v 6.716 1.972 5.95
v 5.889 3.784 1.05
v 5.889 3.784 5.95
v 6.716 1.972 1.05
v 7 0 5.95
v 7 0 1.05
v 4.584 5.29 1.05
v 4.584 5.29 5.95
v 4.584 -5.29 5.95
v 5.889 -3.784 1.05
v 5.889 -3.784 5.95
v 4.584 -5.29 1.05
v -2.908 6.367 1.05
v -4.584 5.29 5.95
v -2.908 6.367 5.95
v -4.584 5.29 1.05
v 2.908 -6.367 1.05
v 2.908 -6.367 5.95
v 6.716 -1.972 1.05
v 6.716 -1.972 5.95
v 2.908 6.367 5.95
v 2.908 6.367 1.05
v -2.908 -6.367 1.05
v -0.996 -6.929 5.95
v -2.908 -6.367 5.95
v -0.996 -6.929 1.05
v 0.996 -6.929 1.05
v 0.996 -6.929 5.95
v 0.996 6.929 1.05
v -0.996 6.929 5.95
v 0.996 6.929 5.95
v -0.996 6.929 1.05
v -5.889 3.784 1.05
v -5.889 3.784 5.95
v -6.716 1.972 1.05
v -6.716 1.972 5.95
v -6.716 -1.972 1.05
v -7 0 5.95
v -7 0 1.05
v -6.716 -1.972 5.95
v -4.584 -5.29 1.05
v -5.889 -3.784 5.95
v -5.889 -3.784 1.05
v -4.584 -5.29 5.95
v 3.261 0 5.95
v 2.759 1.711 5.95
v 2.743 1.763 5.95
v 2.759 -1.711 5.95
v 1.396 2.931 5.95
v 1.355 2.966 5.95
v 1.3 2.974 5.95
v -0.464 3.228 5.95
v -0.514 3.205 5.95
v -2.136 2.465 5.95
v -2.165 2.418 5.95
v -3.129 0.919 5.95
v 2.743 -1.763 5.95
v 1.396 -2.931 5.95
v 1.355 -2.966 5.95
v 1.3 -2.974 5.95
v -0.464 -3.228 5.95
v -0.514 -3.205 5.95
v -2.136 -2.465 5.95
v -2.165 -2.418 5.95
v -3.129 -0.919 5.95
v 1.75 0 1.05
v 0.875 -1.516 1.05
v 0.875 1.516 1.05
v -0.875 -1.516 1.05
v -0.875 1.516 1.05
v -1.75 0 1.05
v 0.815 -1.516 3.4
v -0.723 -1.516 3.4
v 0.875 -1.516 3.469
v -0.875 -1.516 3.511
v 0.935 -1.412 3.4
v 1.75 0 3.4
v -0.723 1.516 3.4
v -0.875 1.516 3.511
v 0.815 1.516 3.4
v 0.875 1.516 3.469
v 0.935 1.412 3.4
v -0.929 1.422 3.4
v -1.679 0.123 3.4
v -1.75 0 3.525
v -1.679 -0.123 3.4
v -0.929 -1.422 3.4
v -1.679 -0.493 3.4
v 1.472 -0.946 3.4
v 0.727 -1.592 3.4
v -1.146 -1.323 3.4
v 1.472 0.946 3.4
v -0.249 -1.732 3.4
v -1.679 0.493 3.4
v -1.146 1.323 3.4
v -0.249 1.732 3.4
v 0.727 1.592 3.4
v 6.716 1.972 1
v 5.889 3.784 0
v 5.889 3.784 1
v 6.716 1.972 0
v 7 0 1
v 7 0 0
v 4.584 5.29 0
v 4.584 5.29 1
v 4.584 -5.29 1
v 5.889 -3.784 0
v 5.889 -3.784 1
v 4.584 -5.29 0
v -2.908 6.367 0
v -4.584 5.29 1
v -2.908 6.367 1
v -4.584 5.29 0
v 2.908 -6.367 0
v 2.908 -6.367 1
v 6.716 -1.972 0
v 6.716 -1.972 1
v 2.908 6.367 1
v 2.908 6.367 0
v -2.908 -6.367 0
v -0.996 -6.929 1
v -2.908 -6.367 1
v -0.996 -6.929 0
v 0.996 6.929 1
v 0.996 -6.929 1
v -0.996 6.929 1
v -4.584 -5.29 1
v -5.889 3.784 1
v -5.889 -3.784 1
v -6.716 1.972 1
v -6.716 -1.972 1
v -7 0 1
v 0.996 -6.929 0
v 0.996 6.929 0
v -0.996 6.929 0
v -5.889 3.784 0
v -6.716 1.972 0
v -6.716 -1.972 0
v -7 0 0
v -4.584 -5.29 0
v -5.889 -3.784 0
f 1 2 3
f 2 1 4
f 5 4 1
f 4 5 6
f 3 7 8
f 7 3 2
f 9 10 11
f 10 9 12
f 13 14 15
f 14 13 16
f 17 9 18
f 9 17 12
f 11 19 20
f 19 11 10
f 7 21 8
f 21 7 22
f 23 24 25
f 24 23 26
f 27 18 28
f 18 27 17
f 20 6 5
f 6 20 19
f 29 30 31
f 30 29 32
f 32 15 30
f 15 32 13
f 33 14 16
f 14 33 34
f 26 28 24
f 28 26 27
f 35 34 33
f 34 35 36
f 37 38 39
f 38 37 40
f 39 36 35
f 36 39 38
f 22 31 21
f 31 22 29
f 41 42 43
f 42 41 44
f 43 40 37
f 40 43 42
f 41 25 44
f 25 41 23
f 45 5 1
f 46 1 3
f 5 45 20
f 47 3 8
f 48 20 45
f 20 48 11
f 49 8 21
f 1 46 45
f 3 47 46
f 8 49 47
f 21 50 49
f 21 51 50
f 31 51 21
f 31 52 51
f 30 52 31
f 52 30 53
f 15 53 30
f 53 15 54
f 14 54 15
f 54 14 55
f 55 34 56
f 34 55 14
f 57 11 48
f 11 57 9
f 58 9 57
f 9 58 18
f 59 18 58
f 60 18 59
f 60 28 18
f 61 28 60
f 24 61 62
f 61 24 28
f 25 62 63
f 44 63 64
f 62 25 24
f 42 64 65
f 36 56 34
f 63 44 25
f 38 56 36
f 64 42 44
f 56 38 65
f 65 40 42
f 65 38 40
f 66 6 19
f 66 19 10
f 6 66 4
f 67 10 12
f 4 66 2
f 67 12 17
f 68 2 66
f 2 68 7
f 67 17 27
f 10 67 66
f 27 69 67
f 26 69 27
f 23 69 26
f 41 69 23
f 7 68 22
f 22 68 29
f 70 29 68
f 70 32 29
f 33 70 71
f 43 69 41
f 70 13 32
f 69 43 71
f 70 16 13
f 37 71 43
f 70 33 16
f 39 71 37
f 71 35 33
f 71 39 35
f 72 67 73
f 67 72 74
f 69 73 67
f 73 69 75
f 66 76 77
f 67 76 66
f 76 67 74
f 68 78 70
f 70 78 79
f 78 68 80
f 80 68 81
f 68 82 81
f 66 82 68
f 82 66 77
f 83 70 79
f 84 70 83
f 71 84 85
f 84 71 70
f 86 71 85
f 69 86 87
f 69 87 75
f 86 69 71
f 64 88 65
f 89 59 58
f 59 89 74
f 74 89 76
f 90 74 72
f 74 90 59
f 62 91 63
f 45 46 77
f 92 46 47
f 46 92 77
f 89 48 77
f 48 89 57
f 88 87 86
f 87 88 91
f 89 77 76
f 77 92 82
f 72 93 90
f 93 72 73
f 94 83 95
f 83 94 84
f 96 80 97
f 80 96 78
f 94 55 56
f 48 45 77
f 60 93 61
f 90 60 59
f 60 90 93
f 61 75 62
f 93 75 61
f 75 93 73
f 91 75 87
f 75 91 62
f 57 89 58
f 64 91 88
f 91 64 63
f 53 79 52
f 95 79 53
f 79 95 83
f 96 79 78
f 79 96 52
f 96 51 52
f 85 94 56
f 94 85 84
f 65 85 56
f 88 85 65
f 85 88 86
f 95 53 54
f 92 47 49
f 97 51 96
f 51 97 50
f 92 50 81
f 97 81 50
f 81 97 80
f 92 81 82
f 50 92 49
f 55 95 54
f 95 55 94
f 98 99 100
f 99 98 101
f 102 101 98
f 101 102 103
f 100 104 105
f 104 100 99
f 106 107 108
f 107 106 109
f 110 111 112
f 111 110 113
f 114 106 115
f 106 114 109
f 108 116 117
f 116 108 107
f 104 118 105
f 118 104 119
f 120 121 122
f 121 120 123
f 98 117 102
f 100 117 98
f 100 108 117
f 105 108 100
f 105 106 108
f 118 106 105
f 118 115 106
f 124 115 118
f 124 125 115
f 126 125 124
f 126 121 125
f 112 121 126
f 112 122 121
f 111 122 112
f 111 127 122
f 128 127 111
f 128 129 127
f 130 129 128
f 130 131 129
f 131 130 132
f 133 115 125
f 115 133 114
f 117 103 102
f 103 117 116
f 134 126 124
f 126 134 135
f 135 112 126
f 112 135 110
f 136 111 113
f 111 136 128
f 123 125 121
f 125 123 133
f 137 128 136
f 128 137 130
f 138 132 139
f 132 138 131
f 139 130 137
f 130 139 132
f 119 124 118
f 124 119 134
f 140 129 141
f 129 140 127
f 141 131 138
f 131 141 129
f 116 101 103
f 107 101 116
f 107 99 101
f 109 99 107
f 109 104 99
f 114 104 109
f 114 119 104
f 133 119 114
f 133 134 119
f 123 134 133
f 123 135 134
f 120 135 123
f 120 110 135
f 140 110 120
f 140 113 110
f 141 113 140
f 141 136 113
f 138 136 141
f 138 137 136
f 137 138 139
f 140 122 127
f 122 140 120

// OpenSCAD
module PermanentMagnet(diameter, height, drilling, lowering, orientation, shim) {

  module polePlate(north) {
    if (north) {
      color("red") cylinder(h=.1,d=diameter,center=true);
    } else {
      color("black") cylinder(h=.1,d=diameter,center=true);
    }    
  }
  
  module pillShim(diameter) {
    color("white") cylinder(h=1,d=diameter);
  }

  module pillBody(diameter, height, drilling, lowering, orientation) {
    translate([0,0,height/2]) {
      difference() {
        union() {
          // body
          color("silver") cylinder(h=height-.2,d=diameter,center=true);
          // north plate
          translate([0,0,height/2-.1]) polePlate(orientation);
          // south plate
          rotate([180,0,0]) translate([0,0,height/2-.1]) polePlate(!orientation);
        }
        // drilling
        union() {
          // vertical drilling
          cylinder(h=height+.1,d=drilling,center=true);
          // conical drilling
          translate([0,0,height/4.0]) cylinder(h=height/2+.2,d1=drilling,d2=lowering,center=true);
        }
      }
    }
  }

  if (shim) {
    pillShim(diameter);
    translate([0,0,1]) pillBody(diameter, height, drilling, lowering, orientation);
  } else {
    pillBody(diameter, height, drilling, lowering, orientation);
  }
}

PermanentMagnet(14,5,3.5,6.7,false,true);
